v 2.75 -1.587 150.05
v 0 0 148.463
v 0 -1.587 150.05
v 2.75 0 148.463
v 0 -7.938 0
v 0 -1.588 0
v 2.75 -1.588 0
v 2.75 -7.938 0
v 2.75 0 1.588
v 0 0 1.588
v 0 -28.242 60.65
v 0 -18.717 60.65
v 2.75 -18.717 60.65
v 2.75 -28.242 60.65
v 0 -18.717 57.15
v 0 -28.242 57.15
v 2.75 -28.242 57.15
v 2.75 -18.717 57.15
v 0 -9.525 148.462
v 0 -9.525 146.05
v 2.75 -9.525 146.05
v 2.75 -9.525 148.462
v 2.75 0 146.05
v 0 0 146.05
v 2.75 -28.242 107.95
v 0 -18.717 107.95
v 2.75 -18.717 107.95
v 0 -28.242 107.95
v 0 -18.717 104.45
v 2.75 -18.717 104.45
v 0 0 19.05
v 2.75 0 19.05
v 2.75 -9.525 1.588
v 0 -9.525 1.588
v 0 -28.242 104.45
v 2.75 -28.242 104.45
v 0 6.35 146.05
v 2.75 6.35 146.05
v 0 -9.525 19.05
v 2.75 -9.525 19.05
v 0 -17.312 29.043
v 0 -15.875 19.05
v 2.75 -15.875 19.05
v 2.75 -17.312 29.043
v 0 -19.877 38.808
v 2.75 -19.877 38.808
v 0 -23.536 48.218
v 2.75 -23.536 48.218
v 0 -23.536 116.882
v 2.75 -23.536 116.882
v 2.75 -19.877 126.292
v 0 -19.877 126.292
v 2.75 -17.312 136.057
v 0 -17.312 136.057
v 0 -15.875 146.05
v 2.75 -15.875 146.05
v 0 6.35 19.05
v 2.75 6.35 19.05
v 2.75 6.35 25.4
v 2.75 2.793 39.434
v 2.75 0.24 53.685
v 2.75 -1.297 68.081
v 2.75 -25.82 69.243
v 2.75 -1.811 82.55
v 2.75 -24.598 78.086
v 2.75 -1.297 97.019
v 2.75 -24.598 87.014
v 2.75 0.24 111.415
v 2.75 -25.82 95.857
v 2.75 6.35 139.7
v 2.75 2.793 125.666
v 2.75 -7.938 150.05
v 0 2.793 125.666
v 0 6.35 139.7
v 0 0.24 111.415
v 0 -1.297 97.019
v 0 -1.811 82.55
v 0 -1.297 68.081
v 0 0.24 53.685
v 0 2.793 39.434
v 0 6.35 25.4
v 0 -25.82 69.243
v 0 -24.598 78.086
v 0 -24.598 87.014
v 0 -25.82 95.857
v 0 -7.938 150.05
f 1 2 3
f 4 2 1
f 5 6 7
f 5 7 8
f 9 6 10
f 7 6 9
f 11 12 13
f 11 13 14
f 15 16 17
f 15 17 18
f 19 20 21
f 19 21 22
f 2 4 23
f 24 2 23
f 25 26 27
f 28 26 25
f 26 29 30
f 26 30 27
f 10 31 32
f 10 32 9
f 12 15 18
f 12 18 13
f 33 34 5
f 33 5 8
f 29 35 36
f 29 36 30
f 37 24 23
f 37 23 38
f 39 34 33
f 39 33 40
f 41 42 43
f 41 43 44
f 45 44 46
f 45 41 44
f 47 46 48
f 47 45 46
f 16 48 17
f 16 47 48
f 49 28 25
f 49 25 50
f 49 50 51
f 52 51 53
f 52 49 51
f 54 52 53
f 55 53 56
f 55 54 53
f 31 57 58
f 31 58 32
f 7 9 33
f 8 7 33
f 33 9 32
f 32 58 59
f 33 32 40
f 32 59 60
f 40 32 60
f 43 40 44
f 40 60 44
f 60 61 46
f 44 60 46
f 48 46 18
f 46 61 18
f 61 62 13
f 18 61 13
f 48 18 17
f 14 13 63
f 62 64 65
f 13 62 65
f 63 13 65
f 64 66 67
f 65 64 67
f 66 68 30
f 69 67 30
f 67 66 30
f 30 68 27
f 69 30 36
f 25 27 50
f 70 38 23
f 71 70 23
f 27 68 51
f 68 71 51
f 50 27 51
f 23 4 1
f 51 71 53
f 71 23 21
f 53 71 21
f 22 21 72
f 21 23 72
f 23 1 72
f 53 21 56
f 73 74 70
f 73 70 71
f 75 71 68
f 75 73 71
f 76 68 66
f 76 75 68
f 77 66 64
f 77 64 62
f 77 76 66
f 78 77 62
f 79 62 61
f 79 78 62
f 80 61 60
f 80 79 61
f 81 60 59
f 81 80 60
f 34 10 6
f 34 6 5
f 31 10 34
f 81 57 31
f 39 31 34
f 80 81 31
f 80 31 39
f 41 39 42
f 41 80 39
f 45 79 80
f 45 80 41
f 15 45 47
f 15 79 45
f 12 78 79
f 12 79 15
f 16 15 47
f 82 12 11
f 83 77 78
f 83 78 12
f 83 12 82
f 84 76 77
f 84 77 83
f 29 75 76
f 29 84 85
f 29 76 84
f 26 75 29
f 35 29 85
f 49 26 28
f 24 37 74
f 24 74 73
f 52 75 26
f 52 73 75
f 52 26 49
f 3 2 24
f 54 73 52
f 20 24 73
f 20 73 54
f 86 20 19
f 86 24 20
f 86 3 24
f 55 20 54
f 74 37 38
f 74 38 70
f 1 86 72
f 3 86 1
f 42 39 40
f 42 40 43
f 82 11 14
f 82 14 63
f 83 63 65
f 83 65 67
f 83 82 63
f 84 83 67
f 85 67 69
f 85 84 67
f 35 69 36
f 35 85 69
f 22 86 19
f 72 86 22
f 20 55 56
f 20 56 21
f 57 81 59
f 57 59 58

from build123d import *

# Parameters (mm, degrees)
BOSS_EXTRUDE1_DEPTH = 2.75
CHAMFER1_SIZE       = 1.5875


with BuildPart() as part:
    # Sketch1 → Boss-Extrude1 (new body)
    with BuildSketch(Plane.YZ):
        with BuildLine():
            Line((-9.525, 19.05), (-15.875, 19.05))
            ThreePointArc((-15.875, 19.05), (-19.876556287, 38.808169282), (-28.241659516, 57.15))
            Line((-28.241659516, 57.15), (-18.716659516, 57.15))
            Line((-18.716659516, 57.15), (-18.716659516, 60.65))
            Line((-18.716659516, 60.65), (-28.241659516, 60.65))
            ThreePointArc((-28.241659516, 60.65), (-24.444713557, 82.55), (-28.241659516, 104.45))
            Line((-28.241659516, 104.45), (-18.716659516, 104.45))
            Line((-18.716659516, 104.45), (-18.716659516, 107.95))
            Line((-18.716659516, 107.95), (-28.241659516, 107.95))
            ThreePointArc((-28.241659516, 107.95), (-19.876556287, 126.291830718), (-15.875, 146.05))
            Line((-15.875, 146.05), (-9.525, 146.05))
            Line((-9.525, 146.05), (-9.525, 150.05))
            Line((-9.525, 150.05), (0, 150.05))
            Line((0, 150.05), (0, 146.05))
            Line((0, 146.05), (6.35, 146.05))
            Line((6.35, 146.05), (6.35, 139.7))
            ThreePointArc((6.35, 139.7), (-1.810573999, 82.55), (6.35, 25.4))
            Line((6.35, 25.4), (6.35, 19.05))
            Line((6.35, 19.05), (0, 19.05))
            Line((0, 19.05), (0, 0))
            Line((0, 0), (-9.525, 0))
            Line((-9.525, 0), (-9.525, 19.05))
        make_face()
    extrude(amount=BOSS_EXTRUDE1_DEPTH)

    # Chamfer1
    chamfer1_edges = [part.edges().sort_by_distance(p)[0] for p in [
        (1.375, 0, 0),
        (1.375, -9.525, 0),
        (1.375, -9.525, 150.05),
        (1.375, 0, 150.05),
    ]]
    chamfer(chamfer1_edges, length=CHAMFER1_SIZE)


solid = part.part
